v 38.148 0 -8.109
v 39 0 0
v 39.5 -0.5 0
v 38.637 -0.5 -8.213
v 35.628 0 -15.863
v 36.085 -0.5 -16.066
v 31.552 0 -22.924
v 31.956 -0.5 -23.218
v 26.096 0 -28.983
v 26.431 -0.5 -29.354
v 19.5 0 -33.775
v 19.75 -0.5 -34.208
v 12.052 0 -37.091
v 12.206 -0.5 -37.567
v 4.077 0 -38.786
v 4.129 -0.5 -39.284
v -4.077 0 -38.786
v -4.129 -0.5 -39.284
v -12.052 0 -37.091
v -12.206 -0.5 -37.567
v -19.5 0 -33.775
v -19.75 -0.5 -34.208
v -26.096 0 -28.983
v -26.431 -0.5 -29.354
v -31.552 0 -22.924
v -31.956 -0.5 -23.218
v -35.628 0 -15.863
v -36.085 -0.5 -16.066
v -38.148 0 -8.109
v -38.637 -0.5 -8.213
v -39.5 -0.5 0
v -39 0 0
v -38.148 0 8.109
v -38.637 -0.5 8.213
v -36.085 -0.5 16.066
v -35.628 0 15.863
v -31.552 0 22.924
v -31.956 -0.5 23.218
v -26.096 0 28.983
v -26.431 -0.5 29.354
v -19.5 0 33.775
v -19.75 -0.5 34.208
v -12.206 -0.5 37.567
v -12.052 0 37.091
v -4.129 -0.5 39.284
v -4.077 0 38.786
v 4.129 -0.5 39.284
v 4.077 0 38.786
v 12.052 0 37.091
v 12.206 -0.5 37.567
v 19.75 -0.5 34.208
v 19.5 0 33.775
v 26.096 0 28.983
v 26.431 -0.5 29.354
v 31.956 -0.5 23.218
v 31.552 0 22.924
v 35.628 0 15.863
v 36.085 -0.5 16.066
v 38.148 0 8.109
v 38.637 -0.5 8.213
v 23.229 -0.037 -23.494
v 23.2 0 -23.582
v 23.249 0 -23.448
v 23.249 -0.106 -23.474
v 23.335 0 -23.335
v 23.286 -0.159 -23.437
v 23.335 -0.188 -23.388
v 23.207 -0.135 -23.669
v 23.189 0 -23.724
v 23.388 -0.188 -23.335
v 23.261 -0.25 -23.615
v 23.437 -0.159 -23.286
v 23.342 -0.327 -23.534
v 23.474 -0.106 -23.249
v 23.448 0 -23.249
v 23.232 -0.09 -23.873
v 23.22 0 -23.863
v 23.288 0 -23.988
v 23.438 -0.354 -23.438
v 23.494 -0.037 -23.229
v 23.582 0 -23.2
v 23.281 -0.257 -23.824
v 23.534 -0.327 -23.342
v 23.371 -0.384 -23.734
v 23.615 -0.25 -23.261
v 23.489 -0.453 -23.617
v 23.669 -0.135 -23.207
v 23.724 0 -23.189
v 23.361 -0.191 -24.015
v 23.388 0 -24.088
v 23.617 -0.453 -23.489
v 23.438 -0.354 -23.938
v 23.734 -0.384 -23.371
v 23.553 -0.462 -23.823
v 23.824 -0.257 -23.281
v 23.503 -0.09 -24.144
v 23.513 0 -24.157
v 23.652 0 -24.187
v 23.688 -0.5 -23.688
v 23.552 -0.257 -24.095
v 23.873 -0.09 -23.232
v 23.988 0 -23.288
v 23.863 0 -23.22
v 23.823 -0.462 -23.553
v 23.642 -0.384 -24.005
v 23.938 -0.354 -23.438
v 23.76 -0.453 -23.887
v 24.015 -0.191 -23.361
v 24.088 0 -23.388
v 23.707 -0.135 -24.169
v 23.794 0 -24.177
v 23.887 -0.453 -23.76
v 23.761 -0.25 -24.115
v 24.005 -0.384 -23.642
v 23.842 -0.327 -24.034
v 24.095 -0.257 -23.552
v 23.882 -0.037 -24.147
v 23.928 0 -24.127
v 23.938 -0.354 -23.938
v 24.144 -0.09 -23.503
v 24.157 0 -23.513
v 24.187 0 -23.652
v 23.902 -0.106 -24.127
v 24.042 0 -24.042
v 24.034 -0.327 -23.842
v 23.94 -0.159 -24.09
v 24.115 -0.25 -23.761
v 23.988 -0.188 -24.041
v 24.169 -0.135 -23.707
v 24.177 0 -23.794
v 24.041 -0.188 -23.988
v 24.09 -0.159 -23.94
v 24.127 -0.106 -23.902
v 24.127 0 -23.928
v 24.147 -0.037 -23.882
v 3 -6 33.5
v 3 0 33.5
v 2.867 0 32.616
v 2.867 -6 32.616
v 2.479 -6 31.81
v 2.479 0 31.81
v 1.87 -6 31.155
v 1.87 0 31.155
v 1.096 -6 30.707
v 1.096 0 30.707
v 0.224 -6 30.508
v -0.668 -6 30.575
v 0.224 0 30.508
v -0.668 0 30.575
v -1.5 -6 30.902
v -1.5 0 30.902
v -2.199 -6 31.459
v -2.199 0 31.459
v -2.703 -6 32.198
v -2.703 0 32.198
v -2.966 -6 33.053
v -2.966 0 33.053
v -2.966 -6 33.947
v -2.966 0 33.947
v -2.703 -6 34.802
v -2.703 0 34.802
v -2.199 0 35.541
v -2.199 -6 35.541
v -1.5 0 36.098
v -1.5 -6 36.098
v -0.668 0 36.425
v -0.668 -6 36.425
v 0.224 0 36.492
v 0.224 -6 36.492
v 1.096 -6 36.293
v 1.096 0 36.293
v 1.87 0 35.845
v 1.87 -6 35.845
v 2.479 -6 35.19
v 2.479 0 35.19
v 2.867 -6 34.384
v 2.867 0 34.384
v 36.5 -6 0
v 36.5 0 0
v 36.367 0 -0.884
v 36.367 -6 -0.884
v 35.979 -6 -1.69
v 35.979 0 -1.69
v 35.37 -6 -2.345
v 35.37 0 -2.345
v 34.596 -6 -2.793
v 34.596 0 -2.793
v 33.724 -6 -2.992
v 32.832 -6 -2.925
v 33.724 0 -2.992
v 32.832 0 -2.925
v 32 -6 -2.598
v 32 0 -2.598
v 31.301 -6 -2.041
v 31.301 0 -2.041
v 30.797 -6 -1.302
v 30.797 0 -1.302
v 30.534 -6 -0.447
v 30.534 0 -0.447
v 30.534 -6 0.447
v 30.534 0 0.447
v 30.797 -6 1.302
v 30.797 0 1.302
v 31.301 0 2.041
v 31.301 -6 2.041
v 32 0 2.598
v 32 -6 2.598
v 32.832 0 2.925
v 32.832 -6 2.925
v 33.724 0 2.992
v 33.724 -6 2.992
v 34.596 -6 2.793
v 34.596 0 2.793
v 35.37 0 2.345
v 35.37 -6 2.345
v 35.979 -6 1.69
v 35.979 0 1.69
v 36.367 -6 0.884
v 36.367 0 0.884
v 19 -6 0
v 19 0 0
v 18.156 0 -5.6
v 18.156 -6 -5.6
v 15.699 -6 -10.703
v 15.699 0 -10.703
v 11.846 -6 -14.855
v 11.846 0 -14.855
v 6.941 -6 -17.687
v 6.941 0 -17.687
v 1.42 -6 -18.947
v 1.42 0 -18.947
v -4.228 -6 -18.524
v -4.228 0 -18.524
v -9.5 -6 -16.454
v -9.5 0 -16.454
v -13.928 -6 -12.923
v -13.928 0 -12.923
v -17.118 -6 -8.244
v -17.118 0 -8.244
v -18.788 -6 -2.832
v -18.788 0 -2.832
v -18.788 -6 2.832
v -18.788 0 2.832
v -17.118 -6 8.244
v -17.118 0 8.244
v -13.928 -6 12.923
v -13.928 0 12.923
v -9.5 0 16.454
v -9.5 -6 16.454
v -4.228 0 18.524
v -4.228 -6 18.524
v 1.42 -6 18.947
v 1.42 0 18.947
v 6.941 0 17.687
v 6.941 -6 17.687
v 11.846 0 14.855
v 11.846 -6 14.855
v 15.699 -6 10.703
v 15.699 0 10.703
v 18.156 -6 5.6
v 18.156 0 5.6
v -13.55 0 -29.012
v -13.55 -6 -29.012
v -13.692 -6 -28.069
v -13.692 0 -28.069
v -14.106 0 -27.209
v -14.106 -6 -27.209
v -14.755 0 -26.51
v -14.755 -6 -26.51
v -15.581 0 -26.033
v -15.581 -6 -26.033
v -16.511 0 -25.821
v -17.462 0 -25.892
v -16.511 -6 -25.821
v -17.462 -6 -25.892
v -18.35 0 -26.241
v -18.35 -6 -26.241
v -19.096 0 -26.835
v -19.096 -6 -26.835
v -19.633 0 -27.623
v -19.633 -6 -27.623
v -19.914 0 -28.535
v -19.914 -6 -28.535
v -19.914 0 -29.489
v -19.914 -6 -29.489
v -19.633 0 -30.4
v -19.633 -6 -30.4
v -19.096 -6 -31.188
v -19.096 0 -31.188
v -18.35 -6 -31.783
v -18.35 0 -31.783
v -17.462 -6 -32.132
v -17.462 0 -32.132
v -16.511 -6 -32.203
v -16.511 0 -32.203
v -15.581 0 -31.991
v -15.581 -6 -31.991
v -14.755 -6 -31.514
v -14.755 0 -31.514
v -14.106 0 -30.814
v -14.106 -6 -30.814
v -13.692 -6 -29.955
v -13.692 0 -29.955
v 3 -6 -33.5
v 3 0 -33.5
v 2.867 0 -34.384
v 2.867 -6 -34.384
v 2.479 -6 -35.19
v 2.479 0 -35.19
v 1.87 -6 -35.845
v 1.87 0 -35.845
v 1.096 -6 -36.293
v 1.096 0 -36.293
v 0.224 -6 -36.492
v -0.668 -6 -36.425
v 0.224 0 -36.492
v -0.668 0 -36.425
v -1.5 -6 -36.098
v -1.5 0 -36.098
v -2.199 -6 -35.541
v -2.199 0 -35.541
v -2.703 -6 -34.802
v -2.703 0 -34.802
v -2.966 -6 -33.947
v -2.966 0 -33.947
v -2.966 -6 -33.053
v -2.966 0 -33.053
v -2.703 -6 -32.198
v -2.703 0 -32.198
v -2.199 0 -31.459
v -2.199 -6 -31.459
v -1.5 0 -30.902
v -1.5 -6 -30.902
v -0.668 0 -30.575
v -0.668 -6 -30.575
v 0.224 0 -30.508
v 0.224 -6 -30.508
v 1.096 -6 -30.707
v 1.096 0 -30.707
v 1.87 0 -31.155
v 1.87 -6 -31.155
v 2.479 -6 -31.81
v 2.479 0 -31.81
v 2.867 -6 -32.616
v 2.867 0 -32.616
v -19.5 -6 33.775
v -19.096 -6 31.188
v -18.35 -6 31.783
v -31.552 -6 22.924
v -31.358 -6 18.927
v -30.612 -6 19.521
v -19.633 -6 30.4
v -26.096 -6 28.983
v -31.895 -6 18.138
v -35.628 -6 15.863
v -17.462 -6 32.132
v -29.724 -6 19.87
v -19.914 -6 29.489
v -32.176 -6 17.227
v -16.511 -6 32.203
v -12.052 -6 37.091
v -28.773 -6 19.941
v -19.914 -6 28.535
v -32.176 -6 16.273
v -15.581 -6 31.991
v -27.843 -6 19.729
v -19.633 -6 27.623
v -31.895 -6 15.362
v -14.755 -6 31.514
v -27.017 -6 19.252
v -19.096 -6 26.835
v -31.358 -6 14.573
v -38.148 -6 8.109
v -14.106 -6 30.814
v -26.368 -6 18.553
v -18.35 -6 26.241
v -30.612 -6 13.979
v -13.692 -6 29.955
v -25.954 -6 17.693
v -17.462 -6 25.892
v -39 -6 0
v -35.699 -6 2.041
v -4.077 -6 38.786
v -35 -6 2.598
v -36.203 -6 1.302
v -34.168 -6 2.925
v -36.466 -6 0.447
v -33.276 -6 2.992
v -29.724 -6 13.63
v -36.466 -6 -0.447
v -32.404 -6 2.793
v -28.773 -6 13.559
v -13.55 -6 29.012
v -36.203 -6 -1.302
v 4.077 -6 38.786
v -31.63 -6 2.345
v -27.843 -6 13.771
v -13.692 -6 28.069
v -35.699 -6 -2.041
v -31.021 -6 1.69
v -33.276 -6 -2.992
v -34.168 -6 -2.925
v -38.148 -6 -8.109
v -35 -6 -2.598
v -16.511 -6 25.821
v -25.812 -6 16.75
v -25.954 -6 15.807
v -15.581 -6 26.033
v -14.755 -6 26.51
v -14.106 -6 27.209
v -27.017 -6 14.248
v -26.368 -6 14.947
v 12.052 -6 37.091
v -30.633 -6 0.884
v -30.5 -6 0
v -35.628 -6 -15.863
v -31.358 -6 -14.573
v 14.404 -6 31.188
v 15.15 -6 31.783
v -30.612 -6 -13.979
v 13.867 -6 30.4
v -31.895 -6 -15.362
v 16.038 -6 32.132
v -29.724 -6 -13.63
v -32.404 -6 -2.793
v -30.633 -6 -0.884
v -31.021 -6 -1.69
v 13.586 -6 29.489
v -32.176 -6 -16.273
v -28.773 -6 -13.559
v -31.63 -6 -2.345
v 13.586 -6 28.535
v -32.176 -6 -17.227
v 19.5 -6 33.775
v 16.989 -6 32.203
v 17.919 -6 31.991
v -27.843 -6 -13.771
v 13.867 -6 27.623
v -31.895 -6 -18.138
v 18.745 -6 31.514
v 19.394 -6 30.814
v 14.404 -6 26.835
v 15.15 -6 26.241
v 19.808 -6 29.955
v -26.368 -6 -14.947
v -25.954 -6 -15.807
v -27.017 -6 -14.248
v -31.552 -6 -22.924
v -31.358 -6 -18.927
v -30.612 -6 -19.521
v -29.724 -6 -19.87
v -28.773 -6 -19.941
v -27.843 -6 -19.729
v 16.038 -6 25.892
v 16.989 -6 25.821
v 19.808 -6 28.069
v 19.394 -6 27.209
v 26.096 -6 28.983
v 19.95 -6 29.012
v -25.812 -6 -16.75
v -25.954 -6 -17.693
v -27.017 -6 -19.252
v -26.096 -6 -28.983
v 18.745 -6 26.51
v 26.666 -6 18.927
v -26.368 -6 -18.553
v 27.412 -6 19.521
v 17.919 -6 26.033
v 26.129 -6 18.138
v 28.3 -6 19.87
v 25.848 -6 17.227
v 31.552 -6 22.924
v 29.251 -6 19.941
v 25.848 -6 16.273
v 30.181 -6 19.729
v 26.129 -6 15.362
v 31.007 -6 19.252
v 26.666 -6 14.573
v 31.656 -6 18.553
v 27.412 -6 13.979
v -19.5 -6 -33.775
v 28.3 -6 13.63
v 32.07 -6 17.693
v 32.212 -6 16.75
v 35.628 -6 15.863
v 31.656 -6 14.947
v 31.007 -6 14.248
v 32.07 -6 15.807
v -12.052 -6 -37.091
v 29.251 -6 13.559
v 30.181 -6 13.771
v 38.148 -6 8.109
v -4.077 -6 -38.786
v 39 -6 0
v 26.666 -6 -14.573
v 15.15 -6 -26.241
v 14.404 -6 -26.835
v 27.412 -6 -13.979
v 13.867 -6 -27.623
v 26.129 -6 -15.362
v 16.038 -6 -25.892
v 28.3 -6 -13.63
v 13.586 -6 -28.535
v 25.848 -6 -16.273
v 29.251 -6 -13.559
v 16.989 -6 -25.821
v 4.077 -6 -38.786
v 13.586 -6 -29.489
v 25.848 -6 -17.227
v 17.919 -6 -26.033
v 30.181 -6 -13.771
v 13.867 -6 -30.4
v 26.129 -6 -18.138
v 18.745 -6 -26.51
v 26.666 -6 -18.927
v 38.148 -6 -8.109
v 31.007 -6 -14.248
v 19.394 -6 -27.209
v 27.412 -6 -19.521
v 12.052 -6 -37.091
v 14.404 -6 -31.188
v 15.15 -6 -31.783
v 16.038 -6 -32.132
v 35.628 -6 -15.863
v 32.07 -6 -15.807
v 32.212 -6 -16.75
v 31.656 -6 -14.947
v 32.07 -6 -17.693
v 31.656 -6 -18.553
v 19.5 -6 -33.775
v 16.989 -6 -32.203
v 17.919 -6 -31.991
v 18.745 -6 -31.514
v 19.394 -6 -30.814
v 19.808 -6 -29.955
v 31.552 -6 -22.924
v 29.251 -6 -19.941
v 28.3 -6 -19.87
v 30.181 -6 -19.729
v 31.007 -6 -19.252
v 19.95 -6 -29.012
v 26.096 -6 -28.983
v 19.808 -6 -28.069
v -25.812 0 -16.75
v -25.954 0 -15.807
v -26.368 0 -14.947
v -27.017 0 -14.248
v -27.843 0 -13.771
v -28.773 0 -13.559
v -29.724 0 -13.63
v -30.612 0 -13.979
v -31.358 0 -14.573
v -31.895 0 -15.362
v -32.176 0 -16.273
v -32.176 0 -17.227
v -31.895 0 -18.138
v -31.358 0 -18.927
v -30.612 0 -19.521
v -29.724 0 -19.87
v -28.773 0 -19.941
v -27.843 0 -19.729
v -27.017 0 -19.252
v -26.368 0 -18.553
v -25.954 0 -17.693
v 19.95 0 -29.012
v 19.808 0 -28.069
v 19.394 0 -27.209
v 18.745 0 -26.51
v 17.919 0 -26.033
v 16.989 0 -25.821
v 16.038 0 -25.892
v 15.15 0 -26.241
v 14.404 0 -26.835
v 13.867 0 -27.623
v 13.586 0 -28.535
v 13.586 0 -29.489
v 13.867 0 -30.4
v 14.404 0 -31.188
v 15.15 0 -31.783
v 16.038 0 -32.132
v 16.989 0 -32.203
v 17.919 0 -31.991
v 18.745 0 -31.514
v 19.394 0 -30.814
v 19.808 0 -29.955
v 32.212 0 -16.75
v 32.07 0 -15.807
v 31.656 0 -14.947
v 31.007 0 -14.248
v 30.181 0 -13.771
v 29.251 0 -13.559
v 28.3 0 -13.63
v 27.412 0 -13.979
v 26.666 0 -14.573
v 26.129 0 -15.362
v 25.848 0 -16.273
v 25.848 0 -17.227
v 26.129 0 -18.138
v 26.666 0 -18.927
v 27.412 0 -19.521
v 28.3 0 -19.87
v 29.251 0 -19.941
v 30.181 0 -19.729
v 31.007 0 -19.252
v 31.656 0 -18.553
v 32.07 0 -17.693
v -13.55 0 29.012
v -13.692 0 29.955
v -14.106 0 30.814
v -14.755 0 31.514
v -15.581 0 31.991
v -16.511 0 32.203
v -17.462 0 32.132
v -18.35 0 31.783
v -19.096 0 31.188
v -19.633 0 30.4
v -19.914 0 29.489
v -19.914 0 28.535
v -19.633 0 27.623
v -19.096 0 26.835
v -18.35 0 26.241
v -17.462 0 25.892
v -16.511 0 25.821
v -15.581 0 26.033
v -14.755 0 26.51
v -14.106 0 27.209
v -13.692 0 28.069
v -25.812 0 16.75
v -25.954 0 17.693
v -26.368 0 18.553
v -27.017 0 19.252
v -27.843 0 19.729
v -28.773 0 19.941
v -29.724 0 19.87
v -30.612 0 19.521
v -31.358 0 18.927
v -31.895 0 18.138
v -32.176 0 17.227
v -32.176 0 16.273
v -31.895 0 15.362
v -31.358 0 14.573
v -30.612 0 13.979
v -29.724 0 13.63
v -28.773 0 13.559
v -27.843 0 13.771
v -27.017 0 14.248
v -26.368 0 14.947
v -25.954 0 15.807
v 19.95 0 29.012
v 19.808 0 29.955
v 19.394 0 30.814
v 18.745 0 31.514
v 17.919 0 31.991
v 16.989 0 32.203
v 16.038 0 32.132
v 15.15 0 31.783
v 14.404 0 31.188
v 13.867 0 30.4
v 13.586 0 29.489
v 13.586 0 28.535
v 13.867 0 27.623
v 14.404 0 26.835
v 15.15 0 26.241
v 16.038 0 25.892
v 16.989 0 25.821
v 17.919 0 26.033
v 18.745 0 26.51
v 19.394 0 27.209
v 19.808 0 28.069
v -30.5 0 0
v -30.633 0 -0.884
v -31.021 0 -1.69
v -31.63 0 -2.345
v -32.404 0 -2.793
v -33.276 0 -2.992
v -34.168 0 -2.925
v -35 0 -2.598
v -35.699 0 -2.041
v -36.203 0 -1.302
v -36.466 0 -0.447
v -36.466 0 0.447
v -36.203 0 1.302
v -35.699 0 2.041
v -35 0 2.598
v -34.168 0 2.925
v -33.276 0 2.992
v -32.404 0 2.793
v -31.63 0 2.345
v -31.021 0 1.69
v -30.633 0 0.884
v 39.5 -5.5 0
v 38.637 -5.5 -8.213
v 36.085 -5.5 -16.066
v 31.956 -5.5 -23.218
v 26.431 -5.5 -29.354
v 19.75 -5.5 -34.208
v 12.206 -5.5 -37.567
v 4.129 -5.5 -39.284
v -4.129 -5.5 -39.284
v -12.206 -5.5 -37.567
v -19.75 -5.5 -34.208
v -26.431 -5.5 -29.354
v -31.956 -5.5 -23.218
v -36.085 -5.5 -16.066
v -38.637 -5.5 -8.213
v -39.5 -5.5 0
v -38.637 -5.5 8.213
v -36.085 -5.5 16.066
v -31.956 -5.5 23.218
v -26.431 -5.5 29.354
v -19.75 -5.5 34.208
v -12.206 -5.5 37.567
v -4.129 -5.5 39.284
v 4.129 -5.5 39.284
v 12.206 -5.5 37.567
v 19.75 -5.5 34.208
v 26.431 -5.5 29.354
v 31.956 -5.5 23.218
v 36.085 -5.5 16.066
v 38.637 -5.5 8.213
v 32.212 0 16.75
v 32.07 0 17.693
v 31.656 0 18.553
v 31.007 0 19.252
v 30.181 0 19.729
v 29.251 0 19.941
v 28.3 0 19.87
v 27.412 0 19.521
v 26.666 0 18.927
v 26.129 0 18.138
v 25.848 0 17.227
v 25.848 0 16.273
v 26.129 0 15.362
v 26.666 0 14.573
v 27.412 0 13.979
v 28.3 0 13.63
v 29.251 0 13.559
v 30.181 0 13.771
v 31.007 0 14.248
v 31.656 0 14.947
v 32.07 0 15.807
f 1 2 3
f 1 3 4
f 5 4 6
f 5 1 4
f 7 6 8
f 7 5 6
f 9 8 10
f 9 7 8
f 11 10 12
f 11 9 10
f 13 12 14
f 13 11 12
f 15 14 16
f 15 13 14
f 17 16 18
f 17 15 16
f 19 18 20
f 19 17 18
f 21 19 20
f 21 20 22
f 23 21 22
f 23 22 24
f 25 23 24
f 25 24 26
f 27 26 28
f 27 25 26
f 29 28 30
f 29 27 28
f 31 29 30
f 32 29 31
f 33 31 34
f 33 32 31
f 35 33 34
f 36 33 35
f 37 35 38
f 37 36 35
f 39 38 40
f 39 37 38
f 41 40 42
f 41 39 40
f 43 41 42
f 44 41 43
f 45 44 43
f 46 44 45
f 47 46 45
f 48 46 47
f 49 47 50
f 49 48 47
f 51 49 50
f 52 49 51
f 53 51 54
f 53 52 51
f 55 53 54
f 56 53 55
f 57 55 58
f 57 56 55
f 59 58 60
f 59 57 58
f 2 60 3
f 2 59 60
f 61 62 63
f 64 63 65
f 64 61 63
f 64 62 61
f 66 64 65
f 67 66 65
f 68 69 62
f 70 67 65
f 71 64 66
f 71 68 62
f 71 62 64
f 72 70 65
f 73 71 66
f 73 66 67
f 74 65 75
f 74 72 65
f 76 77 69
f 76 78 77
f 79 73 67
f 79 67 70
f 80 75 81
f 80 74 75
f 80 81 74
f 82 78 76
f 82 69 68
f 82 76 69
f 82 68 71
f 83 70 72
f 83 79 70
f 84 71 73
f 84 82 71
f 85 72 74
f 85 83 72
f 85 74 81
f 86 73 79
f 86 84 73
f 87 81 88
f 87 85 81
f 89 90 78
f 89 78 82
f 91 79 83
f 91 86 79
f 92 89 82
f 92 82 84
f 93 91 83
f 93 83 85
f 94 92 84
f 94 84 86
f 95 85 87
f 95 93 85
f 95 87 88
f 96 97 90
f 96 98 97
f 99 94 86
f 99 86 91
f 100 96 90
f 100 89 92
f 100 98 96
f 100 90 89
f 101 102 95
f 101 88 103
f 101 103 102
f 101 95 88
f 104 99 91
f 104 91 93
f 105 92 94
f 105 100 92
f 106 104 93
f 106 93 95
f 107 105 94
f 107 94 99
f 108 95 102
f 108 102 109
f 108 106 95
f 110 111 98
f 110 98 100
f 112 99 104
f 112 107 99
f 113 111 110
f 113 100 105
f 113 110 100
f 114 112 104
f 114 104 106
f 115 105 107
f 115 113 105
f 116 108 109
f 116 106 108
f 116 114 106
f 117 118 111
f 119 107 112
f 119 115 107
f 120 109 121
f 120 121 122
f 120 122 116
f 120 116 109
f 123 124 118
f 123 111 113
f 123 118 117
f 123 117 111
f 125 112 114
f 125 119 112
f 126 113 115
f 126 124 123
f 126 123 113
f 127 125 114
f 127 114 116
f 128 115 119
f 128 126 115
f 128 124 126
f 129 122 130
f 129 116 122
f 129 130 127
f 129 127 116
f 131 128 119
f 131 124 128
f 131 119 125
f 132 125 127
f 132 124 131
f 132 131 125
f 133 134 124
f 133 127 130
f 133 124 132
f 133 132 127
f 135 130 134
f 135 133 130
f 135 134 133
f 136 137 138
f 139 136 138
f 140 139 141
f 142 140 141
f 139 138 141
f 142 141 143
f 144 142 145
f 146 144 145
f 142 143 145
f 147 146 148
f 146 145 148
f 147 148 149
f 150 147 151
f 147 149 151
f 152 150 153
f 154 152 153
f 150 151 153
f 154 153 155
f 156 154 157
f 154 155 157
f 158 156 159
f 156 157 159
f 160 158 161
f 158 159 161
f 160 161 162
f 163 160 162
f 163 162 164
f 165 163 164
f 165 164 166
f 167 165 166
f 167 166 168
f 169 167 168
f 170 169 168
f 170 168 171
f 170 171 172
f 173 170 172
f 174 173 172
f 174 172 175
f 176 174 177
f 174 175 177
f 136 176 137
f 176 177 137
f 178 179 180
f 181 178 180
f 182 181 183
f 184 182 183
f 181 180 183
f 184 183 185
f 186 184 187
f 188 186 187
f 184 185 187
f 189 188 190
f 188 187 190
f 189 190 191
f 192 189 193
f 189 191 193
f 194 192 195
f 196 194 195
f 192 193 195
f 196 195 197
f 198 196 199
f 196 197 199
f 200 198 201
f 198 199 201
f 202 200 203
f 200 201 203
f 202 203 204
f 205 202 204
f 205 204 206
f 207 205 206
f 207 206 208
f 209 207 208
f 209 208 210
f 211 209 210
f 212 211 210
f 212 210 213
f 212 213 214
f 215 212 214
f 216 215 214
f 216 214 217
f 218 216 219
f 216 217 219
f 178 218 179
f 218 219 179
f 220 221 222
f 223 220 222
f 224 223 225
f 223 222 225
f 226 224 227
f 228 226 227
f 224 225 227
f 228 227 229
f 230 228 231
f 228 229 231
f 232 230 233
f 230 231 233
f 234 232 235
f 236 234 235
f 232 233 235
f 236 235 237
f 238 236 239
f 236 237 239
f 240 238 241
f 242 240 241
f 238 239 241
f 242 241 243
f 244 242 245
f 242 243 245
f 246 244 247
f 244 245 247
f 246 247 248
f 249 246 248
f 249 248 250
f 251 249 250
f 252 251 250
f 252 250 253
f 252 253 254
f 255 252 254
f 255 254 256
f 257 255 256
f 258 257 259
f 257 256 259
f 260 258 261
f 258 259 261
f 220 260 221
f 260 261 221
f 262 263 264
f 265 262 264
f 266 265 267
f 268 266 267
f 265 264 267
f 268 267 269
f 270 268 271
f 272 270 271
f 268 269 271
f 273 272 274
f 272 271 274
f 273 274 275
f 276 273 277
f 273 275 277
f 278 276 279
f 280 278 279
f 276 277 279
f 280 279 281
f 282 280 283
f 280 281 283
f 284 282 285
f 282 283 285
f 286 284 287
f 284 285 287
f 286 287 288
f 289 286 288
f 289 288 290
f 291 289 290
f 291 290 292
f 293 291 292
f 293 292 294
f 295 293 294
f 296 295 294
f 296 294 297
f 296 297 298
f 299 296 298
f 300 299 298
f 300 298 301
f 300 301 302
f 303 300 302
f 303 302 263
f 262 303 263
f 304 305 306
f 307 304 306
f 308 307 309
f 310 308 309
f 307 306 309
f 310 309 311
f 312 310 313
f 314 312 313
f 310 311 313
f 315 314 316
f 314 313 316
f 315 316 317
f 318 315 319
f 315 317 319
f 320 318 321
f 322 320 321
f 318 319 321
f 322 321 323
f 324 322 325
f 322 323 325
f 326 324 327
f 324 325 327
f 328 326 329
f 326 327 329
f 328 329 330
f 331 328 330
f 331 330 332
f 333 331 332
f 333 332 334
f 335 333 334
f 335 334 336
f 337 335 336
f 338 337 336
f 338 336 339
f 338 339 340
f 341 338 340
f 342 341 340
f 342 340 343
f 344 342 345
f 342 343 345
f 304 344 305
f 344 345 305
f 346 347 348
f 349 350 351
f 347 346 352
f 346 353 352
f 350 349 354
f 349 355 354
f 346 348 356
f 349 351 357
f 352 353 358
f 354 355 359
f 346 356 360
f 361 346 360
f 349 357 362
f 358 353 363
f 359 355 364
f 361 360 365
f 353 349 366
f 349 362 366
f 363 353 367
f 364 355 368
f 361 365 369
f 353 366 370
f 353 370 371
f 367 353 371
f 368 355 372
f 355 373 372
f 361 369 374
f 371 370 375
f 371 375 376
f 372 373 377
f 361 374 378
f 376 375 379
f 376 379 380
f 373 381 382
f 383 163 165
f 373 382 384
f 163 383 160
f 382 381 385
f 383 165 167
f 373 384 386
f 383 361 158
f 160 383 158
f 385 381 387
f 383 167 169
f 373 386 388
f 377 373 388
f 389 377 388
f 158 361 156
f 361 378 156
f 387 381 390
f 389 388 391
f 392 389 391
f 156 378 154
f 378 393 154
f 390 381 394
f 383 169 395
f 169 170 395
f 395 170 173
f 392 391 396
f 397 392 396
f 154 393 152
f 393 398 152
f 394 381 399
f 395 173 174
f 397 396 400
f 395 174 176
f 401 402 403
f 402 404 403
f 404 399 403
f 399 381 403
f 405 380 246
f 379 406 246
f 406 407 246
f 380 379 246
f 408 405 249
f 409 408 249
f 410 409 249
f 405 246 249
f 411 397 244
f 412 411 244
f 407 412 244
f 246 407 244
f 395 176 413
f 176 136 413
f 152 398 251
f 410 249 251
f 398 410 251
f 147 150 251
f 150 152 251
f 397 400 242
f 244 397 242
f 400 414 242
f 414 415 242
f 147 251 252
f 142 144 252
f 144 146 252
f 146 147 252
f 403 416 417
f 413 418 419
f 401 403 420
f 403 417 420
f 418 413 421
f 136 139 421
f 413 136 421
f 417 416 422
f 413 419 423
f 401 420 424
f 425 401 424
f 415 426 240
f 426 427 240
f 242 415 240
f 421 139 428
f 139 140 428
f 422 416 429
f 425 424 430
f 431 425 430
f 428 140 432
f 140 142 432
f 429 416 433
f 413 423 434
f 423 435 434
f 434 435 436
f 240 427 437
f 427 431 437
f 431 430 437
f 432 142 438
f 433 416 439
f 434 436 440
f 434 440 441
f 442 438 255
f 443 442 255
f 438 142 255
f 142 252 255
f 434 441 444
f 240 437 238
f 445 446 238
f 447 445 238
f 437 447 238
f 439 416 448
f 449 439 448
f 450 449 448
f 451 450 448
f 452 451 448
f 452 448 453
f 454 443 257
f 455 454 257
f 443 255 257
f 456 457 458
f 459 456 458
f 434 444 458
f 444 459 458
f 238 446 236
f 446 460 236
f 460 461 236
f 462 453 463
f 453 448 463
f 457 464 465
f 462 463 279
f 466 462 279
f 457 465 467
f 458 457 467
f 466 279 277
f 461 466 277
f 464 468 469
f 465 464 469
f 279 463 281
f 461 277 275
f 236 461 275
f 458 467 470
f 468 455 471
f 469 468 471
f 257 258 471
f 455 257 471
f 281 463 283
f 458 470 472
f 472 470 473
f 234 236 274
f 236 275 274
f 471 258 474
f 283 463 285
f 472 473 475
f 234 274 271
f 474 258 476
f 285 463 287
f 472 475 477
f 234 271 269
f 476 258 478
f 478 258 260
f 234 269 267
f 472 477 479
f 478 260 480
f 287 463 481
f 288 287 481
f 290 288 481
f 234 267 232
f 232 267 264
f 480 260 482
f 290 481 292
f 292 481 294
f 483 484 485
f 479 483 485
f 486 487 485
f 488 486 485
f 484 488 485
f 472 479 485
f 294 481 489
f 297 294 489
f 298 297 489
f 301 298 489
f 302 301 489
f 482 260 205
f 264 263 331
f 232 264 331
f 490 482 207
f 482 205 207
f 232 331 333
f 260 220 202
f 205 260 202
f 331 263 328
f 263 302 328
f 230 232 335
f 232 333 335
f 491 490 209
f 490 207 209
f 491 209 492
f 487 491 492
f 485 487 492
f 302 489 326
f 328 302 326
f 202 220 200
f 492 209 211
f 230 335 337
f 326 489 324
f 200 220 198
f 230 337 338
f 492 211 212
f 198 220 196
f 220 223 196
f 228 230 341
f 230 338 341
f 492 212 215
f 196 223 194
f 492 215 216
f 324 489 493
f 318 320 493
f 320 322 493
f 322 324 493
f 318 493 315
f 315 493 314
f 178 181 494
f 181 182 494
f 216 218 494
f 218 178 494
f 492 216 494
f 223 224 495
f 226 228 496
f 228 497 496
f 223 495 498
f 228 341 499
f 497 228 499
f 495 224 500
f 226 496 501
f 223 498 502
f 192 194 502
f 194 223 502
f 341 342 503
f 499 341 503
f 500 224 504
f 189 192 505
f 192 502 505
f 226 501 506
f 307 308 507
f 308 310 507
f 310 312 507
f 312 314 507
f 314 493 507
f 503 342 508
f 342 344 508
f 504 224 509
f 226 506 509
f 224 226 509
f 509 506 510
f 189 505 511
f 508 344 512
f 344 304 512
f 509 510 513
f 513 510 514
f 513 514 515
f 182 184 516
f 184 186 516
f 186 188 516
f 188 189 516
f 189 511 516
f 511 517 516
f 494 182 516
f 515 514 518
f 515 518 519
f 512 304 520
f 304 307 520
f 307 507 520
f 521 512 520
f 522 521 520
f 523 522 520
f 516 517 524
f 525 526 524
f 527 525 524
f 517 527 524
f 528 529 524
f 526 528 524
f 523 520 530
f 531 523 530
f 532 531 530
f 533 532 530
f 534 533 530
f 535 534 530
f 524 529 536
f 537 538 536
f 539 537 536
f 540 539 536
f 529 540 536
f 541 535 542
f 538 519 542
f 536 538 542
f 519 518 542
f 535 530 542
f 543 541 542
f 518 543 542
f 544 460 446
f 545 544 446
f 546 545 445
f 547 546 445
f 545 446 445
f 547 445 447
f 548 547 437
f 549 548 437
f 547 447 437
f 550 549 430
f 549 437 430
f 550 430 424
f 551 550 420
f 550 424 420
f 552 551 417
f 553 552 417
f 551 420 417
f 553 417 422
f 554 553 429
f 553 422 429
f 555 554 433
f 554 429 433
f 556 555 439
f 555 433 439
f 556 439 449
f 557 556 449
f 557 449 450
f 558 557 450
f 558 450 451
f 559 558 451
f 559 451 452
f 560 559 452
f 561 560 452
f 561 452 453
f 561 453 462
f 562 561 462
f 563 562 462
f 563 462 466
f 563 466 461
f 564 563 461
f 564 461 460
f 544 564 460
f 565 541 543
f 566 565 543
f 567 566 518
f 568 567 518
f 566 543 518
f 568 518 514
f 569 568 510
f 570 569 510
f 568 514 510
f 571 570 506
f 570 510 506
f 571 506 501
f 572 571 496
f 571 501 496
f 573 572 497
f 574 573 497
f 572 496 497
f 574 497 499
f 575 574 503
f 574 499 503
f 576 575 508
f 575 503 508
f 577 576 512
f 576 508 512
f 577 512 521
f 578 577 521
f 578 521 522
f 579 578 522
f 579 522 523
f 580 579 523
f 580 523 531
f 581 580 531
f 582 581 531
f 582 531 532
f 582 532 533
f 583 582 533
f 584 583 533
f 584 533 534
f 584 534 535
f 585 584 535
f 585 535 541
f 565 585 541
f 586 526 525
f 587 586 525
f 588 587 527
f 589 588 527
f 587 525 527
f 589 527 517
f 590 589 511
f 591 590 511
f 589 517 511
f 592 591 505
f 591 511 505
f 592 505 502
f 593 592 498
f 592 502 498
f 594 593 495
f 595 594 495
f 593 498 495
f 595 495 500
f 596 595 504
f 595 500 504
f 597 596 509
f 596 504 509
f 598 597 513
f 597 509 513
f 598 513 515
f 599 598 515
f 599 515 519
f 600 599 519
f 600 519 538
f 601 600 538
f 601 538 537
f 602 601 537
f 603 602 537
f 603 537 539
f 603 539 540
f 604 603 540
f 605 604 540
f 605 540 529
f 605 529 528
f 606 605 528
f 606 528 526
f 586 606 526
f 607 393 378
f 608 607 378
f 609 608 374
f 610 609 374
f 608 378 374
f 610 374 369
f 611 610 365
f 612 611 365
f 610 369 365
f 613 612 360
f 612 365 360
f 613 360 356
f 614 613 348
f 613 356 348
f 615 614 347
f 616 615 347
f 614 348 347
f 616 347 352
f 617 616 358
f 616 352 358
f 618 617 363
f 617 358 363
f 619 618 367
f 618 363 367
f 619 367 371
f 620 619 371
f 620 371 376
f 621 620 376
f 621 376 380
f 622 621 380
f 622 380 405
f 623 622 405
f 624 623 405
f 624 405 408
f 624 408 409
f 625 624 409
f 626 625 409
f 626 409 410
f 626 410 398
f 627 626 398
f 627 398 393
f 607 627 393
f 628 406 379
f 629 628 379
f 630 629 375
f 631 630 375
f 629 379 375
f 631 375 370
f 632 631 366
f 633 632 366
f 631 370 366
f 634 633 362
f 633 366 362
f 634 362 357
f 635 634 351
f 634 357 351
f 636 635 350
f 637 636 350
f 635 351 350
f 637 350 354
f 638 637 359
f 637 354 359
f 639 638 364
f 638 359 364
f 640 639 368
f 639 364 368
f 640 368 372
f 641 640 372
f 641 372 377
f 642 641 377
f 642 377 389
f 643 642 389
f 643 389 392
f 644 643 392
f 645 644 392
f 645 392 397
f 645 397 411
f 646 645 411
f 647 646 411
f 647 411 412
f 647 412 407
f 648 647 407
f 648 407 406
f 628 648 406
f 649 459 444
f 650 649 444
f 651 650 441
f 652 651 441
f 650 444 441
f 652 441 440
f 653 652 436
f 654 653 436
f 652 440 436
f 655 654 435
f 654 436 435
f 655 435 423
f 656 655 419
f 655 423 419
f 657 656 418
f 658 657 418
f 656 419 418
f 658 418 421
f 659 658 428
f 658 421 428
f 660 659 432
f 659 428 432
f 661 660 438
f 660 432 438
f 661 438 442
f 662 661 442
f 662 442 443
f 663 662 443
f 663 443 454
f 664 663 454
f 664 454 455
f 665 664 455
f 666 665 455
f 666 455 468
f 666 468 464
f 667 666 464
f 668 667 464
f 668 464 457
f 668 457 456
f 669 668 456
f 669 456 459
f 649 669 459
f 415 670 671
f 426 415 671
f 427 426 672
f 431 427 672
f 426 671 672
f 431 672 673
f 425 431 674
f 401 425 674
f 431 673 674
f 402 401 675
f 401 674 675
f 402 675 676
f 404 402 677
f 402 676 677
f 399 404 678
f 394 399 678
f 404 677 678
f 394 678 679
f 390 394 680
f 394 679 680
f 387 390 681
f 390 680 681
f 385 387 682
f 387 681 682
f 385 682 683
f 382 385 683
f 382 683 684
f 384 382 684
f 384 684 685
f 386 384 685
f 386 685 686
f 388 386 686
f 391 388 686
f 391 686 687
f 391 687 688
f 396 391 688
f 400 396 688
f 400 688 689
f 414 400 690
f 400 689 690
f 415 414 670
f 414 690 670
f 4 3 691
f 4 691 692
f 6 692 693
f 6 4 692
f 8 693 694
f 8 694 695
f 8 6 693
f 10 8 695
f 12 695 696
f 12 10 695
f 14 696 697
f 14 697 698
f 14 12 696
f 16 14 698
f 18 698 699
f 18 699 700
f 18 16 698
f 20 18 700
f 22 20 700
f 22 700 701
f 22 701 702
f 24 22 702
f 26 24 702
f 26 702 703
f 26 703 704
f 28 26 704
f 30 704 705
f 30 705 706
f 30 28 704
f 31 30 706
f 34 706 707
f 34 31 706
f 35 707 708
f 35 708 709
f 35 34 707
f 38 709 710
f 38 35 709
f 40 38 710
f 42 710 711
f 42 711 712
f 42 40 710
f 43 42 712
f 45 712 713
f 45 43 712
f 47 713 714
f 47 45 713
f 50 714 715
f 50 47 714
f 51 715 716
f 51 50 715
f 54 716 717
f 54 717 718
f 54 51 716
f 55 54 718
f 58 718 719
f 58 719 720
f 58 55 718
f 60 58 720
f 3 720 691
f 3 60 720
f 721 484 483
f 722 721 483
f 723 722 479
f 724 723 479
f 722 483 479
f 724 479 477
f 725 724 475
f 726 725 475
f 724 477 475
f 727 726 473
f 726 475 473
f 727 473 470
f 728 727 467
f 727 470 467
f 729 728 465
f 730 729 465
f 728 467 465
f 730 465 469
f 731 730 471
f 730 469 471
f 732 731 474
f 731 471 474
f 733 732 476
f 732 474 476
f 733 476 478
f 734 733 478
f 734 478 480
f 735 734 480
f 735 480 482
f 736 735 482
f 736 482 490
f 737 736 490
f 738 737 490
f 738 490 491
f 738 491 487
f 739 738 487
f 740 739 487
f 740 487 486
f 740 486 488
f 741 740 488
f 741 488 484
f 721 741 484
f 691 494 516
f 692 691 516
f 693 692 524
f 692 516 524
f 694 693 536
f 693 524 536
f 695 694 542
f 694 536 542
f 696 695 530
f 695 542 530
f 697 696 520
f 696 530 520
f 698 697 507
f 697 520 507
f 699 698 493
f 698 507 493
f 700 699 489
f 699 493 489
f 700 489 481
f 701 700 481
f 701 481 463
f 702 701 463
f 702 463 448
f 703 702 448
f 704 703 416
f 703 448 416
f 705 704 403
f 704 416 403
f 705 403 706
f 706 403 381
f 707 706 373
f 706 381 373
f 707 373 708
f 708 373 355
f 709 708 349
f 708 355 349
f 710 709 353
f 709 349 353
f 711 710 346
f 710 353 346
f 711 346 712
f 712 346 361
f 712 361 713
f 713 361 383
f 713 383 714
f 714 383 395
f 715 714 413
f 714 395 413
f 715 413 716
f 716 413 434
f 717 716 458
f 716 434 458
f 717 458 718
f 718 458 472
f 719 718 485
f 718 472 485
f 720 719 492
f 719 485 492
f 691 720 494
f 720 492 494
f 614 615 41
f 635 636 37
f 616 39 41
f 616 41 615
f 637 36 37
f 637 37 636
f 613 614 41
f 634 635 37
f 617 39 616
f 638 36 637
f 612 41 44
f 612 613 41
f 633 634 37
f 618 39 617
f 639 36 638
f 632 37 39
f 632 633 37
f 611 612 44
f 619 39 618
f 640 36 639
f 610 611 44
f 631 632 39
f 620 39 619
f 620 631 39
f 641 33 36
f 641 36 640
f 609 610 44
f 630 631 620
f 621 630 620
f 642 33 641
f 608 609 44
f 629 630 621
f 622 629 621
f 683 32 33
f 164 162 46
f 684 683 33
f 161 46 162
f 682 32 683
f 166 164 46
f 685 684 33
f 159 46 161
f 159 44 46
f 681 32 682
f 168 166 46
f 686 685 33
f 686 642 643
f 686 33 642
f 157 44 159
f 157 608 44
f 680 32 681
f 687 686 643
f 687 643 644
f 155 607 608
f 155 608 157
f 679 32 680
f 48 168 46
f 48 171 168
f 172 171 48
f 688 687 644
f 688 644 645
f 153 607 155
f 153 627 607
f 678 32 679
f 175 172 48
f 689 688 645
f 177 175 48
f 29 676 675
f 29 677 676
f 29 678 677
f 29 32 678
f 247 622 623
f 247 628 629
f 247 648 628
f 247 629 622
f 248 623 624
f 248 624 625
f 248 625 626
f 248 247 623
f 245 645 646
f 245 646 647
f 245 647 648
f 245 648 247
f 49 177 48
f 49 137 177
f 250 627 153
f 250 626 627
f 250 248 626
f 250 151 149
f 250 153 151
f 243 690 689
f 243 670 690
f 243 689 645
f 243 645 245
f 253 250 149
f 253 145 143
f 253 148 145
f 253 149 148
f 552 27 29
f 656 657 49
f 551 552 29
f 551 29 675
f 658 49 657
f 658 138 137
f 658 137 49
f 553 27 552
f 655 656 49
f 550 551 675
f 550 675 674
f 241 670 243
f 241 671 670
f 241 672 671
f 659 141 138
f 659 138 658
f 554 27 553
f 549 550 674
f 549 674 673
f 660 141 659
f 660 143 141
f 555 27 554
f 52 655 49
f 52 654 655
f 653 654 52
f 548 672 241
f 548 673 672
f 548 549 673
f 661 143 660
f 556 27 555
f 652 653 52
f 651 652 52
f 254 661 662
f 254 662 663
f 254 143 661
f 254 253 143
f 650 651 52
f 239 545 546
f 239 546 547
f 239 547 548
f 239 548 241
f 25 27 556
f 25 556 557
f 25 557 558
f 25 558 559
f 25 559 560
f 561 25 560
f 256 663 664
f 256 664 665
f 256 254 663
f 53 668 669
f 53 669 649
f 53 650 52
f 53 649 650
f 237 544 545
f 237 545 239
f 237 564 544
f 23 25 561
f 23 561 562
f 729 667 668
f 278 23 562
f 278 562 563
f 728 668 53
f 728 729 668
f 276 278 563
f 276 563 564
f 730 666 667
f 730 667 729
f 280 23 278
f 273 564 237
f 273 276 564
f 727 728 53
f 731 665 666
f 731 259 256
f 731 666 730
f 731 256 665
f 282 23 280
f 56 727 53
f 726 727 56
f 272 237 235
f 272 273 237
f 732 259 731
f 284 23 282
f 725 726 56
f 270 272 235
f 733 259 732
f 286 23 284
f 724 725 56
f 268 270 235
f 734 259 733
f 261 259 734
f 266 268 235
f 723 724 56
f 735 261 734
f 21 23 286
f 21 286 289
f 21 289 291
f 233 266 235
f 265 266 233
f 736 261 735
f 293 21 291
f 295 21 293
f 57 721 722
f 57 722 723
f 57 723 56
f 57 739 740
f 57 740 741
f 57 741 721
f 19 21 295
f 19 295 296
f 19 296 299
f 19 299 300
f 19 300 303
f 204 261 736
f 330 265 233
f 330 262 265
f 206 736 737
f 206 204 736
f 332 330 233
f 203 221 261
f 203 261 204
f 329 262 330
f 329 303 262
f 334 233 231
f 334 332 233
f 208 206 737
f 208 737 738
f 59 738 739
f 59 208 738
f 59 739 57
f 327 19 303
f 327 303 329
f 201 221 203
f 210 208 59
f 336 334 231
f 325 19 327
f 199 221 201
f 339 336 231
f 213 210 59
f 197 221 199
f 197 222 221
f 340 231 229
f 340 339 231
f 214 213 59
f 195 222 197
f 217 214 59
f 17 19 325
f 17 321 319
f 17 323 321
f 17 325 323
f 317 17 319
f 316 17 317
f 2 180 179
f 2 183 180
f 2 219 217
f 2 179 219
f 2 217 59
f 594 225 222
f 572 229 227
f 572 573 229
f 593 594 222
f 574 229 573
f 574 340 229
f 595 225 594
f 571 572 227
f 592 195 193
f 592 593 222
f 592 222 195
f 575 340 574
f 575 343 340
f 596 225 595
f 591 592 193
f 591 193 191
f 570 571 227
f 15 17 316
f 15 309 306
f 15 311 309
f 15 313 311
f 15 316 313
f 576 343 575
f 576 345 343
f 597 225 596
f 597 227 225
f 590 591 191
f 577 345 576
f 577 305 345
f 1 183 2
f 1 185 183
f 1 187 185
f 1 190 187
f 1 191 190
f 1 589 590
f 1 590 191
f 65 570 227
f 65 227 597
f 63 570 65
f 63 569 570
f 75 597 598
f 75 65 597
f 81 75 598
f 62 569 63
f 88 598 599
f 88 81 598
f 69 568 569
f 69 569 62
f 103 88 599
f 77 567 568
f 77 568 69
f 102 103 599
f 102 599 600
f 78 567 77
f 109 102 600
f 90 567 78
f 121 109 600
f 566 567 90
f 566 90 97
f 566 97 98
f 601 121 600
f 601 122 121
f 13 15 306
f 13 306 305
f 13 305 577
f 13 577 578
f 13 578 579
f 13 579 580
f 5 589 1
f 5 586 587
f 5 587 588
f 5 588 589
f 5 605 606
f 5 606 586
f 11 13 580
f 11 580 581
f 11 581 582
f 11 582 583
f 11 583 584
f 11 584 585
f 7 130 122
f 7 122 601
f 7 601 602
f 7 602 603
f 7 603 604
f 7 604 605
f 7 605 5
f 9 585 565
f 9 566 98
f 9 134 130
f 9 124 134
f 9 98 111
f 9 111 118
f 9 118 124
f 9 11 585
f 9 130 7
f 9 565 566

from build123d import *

# Parameters (mm, degrees)
SKETCH_1_R        = 39.5
SKETCH_1_R_2      = 19
SKETCH_1_R_3      = 3
EXTRUDE_1_DEPTH   = 6
HOLE_WIZARD_M61_D = 6.4
CHAMFER_1_SIZE    = 0.5


with BuildPart() as part:
    # Эскиз1 → Вытянуть1 (new body)
    with BuildSketch(Plane(origin=(0, 0, 0), x_dir=(1, 0, 0), z_dir=(0, 1, 0))):
        Circle(SKETCH_1_R)
        Circle(SKETCH_1_R_2, mode=Mode.SUBTRACT)
        with Locations((0, 33.5)):
            Circle(SKETCH_1_R_3, mode=Mode.SUBTRACT)
        with Locations((33.5, 0)):
            Circle(SKETCH_1_R_3, mode=Mode.SUBTRACT)
        with Locations((-33.5, 0)):
            Circle(SKETCH_1_R_3, mode=Mode.SUBTRACT)
        with Locations((0, -33.5)):
            Circle(SKETCH_1_R_3, mode=Mode.SUBTRACT)
    extrude(amount=-EXTRUDE_1_DEPTH)

    # Отверстие с зазором M61 (through all)
    with Locations(Plane(origin=(0, 0, 0), x_dir=(-1, 0, 0), z_dir=(0, 1, 0))):
        with Locations((16.75, 29.011851027), (29.011851027, -16.75), (-16.75, -29.011851027), (-29.011851027, 16.75), (16.75, -29.011851027), (-29.011851027, -16.75), (-16.75, 29.011851027), (29.011851027, 16.75)):
            Hole(HOLE_WIZARD_M61_D / 2)

    # Фаска1
    chamfer_1_edges = [part.edges().sort_by_distance(p)[0] for p in [
        (-39.5, 0, 0),
        (-39.5, -6, 0),
    ]]
    chamfer(chamfer_1_edges, length=CHAMFER_1_SIZE)

    # Эскиз5 → Вырез-Повернуть1 (revolve, cut)
    with BuildSketch(Plane(origin=(0, 0, 0), x_dir=(1, 0, 0), z_dir=(0, 1, 0))):
        with BuildLine():
            Line((24.04163056, 24.04163056), (23.334523779, 23.334523779))
            ThreePointArc((23.334523779, 23.334523779), (23.334523779, 24.04163056), (24.04163056, 24.04163056))
        make_face()
    revolve(axis=Axis((26.47587554, 0, -26.47587554), (-0.707106781, 0, 0.707106781)), mode=Mode.SUBTRACT)


solid = part.part
